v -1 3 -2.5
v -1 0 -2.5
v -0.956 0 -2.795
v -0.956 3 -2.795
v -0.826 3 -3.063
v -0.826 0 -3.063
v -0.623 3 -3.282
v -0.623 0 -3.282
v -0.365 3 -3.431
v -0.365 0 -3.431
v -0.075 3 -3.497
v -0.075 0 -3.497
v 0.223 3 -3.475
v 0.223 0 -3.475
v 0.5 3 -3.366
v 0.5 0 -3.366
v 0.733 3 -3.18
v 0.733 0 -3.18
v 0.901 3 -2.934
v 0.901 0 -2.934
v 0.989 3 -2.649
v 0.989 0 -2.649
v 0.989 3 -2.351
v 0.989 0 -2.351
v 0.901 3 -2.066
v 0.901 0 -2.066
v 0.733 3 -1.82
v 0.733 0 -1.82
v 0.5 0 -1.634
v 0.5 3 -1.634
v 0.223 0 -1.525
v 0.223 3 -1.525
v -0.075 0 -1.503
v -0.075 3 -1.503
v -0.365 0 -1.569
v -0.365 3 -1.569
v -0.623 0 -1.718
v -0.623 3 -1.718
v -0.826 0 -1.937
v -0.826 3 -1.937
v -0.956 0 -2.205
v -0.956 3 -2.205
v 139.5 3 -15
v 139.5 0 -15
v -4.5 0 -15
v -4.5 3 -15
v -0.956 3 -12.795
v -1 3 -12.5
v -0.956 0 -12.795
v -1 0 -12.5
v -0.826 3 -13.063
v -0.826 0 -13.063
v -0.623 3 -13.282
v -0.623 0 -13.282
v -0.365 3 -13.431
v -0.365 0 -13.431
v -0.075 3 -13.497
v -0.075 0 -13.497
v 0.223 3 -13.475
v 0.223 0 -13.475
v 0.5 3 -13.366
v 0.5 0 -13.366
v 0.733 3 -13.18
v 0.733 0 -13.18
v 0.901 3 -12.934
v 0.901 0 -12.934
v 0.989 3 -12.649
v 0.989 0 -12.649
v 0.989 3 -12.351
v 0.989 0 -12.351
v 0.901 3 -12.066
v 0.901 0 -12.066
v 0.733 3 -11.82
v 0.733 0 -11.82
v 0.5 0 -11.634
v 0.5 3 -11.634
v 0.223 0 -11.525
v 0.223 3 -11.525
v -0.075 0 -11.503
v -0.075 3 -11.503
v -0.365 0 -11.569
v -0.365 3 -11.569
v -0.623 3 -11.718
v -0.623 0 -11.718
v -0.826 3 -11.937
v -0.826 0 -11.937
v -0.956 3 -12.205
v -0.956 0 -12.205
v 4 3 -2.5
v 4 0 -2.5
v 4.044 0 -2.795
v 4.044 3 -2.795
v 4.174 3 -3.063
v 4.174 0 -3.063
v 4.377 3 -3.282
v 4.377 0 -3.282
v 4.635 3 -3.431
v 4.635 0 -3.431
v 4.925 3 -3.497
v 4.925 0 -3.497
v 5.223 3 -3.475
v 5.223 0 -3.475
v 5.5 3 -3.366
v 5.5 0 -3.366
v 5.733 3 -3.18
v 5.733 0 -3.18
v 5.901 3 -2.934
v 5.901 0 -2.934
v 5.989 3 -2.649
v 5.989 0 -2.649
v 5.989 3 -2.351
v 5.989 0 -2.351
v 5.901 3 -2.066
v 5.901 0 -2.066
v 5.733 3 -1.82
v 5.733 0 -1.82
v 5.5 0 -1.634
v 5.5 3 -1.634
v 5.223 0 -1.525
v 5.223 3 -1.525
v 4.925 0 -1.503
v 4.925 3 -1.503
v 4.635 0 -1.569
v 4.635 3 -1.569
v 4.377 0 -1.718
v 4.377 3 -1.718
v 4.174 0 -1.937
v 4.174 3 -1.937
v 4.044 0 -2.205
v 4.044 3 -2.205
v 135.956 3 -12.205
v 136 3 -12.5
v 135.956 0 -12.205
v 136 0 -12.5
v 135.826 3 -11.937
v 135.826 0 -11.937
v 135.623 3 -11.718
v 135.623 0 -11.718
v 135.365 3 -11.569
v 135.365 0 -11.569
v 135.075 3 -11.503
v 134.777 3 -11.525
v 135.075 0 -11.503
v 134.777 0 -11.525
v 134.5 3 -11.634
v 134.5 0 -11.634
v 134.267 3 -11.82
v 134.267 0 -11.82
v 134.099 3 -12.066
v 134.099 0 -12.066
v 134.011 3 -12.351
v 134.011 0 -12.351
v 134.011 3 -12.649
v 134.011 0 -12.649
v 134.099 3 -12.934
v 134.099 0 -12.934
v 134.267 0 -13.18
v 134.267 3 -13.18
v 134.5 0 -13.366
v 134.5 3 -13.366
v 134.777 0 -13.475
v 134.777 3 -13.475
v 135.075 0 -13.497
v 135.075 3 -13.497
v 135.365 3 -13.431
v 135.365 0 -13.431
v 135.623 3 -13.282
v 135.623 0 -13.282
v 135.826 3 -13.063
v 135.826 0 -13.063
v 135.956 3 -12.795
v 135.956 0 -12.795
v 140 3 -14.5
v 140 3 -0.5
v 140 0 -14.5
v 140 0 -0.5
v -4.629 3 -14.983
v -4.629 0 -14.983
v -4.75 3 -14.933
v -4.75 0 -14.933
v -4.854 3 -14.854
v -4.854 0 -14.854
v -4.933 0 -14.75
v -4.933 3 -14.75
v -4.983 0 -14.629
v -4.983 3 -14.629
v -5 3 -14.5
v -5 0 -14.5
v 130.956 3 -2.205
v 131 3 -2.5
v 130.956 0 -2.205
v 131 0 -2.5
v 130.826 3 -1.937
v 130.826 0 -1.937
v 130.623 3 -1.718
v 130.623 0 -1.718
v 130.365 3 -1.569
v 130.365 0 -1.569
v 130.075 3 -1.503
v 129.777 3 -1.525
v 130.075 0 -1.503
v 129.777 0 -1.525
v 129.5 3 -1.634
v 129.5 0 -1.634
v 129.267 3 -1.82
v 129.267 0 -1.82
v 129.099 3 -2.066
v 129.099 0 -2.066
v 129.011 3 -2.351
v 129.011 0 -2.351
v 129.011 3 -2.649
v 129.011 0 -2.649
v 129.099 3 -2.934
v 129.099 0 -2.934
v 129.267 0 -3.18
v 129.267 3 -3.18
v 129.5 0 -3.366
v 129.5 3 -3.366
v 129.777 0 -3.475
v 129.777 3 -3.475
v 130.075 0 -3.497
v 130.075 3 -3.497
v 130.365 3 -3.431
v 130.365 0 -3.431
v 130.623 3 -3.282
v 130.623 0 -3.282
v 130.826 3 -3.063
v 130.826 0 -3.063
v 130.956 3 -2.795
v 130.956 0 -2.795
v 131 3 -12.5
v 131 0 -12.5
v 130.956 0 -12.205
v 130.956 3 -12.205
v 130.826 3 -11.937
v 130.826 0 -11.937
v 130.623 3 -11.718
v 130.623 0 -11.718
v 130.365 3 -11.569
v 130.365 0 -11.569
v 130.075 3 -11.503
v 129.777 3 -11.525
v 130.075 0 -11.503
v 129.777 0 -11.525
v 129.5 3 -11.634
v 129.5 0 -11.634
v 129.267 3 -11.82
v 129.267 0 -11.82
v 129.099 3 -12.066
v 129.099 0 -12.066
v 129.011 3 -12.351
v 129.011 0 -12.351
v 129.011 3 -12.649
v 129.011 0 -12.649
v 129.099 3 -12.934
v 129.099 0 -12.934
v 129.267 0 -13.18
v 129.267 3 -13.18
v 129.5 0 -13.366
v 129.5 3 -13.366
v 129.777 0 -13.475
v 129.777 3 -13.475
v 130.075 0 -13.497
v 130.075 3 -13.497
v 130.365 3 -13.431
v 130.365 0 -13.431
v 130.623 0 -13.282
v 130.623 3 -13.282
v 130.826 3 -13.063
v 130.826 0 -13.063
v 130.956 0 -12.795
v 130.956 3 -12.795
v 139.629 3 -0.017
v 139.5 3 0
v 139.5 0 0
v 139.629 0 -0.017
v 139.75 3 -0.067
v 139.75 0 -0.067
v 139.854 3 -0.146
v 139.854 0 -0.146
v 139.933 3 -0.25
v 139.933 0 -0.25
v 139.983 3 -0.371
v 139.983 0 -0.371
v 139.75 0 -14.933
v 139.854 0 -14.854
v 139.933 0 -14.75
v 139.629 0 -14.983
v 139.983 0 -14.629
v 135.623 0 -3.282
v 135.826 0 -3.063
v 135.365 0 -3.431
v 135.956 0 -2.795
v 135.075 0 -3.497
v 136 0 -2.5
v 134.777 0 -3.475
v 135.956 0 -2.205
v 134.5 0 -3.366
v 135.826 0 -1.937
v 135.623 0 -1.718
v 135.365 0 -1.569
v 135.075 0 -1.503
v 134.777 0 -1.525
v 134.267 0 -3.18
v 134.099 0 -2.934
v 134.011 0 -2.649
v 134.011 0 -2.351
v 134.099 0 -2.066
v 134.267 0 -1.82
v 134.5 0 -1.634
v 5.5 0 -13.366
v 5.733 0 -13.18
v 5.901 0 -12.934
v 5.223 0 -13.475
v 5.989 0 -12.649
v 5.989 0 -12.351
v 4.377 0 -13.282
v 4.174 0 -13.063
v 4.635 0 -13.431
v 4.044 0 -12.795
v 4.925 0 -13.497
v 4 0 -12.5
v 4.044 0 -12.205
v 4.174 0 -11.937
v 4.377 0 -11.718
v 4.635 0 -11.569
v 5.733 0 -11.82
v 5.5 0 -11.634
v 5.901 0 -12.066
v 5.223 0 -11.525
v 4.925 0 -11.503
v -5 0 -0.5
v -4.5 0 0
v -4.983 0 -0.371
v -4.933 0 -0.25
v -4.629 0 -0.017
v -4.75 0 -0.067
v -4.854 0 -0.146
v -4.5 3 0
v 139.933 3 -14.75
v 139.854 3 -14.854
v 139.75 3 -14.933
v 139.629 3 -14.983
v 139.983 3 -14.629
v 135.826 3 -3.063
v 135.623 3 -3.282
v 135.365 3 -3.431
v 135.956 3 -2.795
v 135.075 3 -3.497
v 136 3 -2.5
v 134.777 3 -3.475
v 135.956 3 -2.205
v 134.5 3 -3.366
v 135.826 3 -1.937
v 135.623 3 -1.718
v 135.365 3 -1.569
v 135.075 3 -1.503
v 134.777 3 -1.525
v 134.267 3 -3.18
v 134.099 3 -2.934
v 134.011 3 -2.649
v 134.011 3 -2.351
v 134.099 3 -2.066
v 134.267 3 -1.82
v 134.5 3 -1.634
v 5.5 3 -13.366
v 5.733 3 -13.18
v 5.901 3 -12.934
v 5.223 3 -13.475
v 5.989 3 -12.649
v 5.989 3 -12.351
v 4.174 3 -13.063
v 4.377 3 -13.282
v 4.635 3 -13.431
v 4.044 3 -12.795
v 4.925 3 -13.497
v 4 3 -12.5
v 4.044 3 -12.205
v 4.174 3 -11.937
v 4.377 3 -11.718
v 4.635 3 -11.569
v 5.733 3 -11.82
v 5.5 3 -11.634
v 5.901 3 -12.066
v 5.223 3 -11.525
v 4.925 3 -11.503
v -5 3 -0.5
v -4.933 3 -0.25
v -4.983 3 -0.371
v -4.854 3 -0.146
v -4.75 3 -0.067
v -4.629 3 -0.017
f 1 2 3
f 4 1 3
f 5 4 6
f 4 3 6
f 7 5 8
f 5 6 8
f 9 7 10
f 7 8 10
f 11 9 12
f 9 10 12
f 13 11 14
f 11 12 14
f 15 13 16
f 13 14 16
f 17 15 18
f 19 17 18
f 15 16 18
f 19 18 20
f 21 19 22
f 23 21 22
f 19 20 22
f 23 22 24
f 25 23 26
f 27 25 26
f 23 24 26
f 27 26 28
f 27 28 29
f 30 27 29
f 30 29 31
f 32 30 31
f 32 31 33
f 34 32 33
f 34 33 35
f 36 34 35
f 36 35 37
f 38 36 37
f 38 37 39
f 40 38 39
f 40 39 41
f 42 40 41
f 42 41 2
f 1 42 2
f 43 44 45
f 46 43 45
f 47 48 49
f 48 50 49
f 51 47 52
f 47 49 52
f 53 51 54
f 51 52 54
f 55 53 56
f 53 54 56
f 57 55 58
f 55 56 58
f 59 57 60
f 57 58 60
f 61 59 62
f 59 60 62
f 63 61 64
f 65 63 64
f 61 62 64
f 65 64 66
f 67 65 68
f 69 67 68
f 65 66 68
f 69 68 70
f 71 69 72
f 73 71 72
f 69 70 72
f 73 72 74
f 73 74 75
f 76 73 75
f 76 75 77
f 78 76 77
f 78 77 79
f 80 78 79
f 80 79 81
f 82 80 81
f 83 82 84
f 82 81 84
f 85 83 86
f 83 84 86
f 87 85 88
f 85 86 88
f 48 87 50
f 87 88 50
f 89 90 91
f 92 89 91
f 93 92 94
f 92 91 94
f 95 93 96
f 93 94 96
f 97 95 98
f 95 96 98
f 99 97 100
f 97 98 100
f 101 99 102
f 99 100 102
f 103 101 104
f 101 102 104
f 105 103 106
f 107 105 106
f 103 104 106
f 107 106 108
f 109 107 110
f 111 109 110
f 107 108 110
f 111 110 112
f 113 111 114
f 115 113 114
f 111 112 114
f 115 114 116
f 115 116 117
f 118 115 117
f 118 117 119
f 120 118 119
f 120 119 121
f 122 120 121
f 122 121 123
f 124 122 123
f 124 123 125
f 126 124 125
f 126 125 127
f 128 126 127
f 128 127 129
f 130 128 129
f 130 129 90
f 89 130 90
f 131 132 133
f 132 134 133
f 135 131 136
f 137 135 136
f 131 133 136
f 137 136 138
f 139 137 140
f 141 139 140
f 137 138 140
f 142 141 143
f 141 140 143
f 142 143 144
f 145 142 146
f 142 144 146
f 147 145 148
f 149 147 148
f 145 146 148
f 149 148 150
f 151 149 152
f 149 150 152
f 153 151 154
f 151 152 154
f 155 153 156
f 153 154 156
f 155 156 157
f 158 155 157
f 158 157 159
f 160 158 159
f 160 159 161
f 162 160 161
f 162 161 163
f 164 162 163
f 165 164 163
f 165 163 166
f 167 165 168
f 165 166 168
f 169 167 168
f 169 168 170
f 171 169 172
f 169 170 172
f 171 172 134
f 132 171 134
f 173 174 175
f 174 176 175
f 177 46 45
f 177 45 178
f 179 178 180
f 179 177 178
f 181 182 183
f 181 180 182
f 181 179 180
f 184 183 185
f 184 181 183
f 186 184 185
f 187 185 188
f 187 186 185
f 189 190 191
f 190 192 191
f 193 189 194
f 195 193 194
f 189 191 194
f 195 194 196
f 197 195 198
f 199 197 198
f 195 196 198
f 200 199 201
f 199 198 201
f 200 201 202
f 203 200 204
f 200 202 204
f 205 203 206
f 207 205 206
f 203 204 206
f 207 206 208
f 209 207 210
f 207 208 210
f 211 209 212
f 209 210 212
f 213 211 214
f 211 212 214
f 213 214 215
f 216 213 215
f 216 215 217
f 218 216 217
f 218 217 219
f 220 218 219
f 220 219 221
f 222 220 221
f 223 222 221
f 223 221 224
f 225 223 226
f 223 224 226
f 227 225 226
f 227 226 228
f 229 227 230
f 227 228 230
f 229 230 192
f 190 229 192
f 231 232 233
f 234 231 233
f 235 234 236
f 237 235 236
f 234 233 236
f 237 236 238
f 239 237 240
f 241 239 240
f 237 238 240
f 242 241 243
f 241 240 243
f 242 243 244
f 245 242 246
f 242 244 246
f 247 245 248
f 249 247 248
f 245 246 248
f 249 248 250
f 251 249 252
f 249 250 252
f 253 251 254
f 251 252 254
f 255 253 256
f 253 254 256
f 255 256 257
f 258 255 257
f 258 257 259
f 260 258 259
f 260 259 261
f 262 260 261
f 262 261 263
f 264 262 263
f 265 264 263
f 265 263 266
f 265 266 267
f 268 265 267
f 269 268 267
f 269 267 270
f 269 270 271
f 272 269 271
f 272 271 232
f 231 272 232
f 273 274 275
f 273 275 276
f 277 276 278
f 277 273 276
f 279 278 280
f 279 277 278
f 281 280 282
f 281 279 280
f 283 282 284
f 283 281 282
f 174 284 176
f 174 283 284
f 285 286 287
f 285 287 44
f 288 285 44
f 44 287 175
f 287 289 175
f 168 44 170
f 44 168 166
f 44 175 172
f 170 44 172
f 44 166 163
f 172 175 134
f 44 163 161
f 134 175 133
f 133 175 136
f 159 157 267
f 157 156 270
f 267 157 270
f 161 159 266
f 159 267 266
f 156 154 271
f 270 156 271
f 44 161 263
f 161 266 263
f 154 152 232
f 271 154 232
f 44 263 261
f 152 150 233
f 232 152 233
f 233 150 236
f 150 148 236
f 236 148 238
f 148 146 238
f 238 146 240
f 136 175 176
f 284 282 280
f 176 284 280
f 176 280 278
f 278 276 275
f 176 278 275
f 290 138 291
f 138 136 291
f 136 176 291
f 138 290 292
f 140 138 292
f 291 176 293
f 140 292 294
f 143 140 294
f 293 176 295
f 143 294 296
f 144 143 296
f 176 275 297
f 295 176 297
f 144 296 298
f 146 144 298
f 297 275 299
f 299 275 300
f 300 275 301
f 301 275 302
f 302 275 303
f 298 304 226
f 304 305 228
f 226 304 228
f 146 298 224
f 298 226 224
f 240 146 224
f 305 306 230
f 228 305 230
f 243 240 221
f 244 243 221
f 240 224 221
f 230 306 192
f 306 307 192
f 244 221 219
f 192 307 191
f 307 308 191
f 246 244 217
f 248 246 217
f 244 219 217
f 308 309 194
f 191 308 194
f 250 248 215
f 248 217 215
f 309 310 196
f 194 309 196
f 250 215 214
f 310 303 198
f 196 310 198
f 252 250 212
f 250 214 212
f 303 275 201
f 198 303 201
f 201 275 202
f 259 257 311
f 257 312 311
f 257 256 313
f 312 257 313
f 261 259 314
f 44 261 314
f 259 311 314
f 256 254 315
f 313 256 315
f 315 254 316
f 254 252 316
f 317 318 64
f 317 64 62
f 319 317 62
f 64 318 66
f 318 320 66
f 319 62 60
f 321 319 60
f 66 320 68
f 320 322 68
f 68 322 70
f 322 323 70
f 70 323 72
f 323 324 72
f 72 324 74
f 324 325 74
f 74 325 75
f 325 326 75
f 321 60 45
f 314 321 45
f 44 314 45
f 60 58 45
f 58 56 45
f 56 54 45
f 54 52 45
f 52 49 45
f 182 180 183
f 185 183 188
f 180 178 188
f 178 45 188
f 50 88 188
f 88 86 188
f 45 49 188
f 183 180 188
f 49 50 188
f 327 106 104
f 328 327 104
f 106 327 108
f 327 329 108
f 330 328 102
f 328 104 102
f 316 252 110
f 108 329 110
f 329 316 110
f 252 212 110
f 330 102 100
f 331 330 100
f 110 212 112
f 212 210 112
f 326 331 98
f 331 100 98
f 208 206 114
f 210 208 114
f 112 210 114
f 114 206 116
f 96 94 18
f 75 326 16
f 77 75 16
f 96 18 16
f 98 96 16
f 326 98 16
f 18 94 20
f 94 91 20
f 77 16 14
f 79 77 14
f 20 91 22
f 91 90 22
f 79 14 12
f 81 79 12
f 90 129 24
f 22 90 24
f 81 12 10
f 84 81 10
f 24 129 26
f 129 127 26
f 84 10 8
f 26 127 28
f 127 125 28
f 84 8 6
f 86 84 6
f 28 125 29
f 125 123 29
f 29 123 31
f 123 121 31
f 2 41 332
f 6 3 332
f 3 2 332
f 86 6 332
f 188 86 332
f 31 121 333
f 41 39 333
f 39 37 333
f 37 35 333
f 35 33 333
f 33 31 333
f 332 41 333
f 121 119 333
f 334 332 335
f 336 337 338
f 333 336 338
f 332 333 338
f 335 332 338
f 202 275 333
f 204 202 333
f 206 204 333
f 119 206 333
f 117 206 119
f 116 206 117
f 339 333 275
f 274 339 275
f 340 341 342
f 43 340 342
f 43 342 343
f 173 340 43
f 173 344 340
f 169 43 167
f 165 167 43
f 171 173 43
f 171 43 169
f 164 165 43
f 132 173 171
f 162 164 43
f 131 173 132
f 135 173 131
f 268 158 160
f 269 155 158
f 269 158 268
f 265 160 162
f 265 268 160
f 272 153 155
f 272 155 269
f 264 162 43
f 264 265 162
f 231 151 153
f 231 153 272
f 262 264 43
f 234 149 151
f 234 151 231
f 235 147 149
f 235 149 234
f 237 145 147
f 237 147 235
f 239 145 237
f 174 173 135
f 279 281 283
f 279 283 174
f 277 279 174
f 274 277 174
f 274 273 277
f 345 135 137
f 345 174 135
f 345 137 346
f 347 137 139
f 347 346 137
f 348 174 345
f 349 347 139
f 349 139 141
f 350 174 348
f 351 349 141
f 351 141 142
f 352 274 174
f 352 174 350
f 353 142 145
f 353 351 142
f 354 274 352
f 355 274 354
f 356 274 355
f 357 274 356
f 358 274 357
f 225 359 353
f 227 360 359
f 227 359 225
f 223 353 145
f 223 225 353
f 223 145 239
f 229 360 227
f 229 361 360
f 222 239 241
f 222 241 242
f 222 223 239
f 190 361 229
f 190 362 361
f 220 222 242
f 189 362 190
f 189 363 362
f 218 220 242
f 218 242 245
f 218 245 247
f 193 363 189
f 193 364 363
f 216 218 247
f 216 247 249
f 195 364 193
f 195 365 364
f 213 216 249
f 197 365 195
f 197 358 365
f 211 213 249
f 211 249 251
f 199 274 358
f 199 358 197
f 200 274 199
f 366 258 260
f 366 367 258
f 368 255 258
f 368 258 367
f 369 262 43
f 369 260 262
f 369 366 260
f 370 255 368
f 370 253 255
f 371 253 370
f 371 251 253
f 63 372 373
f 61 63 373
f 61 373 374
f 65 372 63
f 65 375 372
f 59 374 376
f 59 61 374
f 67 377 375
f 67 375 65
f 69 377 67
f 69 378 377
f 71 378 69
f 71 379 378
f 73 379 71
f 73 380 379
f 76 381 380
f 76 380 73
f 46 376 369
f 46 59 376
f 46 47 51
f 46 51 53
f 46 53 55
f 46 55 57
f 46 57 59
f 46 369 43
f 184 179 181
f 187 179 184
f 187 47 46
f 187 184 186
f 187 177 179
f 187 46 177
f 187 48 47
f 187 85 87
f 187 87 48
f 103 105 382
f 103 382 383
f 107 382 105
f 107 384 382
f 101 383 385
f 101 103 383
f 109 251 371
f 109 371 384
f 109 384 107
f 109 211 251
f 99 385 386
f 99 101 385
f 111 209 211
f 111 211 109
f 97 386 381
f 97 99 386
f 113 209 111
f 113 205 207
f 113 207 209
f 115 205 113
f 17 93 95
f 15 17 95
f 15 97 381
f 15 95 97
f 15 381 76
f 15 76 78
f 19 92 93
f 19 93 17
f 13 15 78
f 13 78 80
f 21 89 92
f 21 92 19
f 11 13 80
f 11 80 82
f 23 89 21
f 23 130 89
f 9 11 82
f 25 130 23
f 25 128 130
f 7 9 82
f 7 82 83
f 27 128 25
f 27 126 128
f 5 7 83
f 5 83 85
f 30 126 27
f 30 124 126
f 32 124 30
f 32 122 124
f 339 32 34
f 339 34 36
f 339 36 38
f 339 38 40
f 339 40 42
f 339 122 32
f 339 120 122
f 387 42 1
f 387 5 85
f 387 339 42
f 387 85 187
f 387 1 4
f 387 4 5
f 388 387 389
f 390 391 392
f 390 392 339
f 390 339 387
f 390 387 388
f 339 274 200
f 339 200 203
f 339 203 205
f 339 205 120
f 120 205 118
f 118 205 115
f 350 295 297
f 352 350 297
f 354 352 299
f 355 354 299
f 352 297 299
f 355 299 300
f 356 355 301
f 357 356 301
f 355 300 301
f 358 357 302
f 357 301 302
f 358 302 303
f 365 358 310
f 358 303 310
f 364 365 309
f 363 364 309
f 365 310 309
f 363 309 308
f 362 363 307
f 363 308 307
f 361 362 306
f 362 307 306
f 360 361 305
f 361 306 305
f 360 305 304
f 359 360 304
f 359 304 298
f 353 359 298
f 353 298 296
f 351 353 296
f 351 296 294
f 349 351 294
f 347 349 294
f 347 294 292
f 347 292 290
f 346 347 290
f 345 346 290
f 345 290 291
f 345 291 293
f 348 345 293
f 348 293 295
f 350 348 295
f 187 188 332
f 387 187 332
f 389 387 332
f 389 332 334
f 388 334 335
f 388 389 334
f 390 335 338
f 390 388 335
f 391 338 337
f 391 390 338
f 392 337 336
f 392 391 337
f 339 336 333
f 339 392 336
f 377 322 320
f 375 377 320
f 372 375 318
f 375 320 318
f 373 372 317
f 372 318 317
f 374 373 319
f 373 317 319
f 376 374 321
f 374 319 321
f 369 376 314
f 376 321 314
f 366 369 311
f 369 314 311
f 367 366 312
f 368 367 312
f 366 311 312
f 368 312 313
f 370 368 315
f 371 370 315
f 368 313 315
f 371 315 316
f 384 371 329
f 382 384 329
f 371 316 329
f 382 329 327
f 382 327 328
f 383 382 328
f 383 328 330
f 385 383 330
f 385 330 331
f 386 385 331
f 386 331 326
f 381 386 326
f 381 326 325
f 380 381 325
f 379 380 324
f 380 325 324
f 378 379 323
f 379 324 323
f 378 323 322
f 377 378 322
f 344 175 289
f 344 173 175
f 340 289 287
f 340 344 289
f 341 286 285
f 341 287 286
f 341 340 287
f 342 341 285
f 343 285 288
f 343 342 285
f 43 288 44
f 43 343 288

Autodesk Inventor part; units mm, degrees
ref_plane "YZ Plane" through (0, 0, 0) normal (1, 0, 0) x (0, 1, 0)
ref_plane "XZ Plane" through (0, 0, 0) normal (0, 1, 0) x (-1, 0, 0)
ref_plane "XY Plane" through (0, 0, 0) normal (0, 0, 1) x (1, 0, 0)
sketch "Sketch3" plane through (0, 0, 0) normal (0, 1, 0) x (-1, 0, 0)
  line L0 (5, 0) -> (-140, 0)
  line L1 (-140, 0) -> (-140, -15)
  line L2 (-140, -15) -> (5, -15)
  line L3 (5, -15) -> (5, 0)
  dimension "d6" = 145
  dimension "d7" = 15
extrude "Plate1" add sketch "Sketch3" along normal blind 3
sketch "Sketch5" plane through (0, 0, 0) normal (0, -1, 0) x (1, 0, 0)
  line L0 (-5, 0) -> (140, 0) projected
  line L1 (-5, -15) -> (-5, 0) projected
  line L2 (140, -15) -> (-5, -15) projected
  line L3 (140, 0) -> (140, -15) projected
  line L4 (140, 0) -> (140, -15) construction
  line L5 (140, -7.5) -> (135, -7.5) construction
  line L6 (135, -7.5) -> (135, -12.5) construction
  line L7 (135, -12.5) -> (135, -2.5) construction
  line L8 (135, -2.5) -> (130, -2.5) construction
  line L9 (130, -2.5) -> (130, -12.5) construction
  circle A0 centre (135, -2.5) radius 1
  circle A1 centre (135, -12.5) radius 1
  circle A2 centre (130, -2.5) radius 1
  circle A3 centre (130, -12.5) radius 1
  point P0 (0, 0)
  dimension "d19" = 5
  dimension "d20" = 5
  dimension "d21" = 10
  dimension "d22" = 5
  dimension "d23" = 2
  dimension "d24" = 2
  dimension "d25" = 2
  dimension "d26" = 2
extrude "Extrusion2" cut sketch "Sketch5" against normal blind 10 contours A0 | A1 | A2 | A3
sketch "Sketch6" plane through (0, 0, 0) normal (0, -1, 0) x (1, 0, 0)
  point P0 (0, 0)
ref_plane "Work Plane1" through (67.5, 0, 0) normal (1, 0, 0) x (0, 0, -1)
mirror "Mirror1" about plane through (67.5, 0, 0) normal (1, 0, 0) of "Extrusion2"
fillet "Fillet1" radius 0.5 4 edges at (-5, 1.5, 0) (140, 1.5, 0) (140, 1.5, -15) (-5, 1.5, -15)
equation "\"d8\" = Thickness"
equation "\"BendRadius\" = Thickness"
equation "\"BendReliefWidth\" = Thickness"
equation "\"BendReliefDepth\" = 0.5 * Thickness"
equation "\"CornerReliefSize\" = 4 * Thickness"
equation "\"MinimumRemnant\" = 2 * Thickness"
equation "\"TransitionRadius\" = BendRadius"
equation "\"JacobiRadiusSize\" = Thickness"
equation "\"GapSize\" = Thickness"
equation "\"Thickness\" = 3"
properties part number "LaminaSoporteAccionadorF" material "Stainless Steel"
